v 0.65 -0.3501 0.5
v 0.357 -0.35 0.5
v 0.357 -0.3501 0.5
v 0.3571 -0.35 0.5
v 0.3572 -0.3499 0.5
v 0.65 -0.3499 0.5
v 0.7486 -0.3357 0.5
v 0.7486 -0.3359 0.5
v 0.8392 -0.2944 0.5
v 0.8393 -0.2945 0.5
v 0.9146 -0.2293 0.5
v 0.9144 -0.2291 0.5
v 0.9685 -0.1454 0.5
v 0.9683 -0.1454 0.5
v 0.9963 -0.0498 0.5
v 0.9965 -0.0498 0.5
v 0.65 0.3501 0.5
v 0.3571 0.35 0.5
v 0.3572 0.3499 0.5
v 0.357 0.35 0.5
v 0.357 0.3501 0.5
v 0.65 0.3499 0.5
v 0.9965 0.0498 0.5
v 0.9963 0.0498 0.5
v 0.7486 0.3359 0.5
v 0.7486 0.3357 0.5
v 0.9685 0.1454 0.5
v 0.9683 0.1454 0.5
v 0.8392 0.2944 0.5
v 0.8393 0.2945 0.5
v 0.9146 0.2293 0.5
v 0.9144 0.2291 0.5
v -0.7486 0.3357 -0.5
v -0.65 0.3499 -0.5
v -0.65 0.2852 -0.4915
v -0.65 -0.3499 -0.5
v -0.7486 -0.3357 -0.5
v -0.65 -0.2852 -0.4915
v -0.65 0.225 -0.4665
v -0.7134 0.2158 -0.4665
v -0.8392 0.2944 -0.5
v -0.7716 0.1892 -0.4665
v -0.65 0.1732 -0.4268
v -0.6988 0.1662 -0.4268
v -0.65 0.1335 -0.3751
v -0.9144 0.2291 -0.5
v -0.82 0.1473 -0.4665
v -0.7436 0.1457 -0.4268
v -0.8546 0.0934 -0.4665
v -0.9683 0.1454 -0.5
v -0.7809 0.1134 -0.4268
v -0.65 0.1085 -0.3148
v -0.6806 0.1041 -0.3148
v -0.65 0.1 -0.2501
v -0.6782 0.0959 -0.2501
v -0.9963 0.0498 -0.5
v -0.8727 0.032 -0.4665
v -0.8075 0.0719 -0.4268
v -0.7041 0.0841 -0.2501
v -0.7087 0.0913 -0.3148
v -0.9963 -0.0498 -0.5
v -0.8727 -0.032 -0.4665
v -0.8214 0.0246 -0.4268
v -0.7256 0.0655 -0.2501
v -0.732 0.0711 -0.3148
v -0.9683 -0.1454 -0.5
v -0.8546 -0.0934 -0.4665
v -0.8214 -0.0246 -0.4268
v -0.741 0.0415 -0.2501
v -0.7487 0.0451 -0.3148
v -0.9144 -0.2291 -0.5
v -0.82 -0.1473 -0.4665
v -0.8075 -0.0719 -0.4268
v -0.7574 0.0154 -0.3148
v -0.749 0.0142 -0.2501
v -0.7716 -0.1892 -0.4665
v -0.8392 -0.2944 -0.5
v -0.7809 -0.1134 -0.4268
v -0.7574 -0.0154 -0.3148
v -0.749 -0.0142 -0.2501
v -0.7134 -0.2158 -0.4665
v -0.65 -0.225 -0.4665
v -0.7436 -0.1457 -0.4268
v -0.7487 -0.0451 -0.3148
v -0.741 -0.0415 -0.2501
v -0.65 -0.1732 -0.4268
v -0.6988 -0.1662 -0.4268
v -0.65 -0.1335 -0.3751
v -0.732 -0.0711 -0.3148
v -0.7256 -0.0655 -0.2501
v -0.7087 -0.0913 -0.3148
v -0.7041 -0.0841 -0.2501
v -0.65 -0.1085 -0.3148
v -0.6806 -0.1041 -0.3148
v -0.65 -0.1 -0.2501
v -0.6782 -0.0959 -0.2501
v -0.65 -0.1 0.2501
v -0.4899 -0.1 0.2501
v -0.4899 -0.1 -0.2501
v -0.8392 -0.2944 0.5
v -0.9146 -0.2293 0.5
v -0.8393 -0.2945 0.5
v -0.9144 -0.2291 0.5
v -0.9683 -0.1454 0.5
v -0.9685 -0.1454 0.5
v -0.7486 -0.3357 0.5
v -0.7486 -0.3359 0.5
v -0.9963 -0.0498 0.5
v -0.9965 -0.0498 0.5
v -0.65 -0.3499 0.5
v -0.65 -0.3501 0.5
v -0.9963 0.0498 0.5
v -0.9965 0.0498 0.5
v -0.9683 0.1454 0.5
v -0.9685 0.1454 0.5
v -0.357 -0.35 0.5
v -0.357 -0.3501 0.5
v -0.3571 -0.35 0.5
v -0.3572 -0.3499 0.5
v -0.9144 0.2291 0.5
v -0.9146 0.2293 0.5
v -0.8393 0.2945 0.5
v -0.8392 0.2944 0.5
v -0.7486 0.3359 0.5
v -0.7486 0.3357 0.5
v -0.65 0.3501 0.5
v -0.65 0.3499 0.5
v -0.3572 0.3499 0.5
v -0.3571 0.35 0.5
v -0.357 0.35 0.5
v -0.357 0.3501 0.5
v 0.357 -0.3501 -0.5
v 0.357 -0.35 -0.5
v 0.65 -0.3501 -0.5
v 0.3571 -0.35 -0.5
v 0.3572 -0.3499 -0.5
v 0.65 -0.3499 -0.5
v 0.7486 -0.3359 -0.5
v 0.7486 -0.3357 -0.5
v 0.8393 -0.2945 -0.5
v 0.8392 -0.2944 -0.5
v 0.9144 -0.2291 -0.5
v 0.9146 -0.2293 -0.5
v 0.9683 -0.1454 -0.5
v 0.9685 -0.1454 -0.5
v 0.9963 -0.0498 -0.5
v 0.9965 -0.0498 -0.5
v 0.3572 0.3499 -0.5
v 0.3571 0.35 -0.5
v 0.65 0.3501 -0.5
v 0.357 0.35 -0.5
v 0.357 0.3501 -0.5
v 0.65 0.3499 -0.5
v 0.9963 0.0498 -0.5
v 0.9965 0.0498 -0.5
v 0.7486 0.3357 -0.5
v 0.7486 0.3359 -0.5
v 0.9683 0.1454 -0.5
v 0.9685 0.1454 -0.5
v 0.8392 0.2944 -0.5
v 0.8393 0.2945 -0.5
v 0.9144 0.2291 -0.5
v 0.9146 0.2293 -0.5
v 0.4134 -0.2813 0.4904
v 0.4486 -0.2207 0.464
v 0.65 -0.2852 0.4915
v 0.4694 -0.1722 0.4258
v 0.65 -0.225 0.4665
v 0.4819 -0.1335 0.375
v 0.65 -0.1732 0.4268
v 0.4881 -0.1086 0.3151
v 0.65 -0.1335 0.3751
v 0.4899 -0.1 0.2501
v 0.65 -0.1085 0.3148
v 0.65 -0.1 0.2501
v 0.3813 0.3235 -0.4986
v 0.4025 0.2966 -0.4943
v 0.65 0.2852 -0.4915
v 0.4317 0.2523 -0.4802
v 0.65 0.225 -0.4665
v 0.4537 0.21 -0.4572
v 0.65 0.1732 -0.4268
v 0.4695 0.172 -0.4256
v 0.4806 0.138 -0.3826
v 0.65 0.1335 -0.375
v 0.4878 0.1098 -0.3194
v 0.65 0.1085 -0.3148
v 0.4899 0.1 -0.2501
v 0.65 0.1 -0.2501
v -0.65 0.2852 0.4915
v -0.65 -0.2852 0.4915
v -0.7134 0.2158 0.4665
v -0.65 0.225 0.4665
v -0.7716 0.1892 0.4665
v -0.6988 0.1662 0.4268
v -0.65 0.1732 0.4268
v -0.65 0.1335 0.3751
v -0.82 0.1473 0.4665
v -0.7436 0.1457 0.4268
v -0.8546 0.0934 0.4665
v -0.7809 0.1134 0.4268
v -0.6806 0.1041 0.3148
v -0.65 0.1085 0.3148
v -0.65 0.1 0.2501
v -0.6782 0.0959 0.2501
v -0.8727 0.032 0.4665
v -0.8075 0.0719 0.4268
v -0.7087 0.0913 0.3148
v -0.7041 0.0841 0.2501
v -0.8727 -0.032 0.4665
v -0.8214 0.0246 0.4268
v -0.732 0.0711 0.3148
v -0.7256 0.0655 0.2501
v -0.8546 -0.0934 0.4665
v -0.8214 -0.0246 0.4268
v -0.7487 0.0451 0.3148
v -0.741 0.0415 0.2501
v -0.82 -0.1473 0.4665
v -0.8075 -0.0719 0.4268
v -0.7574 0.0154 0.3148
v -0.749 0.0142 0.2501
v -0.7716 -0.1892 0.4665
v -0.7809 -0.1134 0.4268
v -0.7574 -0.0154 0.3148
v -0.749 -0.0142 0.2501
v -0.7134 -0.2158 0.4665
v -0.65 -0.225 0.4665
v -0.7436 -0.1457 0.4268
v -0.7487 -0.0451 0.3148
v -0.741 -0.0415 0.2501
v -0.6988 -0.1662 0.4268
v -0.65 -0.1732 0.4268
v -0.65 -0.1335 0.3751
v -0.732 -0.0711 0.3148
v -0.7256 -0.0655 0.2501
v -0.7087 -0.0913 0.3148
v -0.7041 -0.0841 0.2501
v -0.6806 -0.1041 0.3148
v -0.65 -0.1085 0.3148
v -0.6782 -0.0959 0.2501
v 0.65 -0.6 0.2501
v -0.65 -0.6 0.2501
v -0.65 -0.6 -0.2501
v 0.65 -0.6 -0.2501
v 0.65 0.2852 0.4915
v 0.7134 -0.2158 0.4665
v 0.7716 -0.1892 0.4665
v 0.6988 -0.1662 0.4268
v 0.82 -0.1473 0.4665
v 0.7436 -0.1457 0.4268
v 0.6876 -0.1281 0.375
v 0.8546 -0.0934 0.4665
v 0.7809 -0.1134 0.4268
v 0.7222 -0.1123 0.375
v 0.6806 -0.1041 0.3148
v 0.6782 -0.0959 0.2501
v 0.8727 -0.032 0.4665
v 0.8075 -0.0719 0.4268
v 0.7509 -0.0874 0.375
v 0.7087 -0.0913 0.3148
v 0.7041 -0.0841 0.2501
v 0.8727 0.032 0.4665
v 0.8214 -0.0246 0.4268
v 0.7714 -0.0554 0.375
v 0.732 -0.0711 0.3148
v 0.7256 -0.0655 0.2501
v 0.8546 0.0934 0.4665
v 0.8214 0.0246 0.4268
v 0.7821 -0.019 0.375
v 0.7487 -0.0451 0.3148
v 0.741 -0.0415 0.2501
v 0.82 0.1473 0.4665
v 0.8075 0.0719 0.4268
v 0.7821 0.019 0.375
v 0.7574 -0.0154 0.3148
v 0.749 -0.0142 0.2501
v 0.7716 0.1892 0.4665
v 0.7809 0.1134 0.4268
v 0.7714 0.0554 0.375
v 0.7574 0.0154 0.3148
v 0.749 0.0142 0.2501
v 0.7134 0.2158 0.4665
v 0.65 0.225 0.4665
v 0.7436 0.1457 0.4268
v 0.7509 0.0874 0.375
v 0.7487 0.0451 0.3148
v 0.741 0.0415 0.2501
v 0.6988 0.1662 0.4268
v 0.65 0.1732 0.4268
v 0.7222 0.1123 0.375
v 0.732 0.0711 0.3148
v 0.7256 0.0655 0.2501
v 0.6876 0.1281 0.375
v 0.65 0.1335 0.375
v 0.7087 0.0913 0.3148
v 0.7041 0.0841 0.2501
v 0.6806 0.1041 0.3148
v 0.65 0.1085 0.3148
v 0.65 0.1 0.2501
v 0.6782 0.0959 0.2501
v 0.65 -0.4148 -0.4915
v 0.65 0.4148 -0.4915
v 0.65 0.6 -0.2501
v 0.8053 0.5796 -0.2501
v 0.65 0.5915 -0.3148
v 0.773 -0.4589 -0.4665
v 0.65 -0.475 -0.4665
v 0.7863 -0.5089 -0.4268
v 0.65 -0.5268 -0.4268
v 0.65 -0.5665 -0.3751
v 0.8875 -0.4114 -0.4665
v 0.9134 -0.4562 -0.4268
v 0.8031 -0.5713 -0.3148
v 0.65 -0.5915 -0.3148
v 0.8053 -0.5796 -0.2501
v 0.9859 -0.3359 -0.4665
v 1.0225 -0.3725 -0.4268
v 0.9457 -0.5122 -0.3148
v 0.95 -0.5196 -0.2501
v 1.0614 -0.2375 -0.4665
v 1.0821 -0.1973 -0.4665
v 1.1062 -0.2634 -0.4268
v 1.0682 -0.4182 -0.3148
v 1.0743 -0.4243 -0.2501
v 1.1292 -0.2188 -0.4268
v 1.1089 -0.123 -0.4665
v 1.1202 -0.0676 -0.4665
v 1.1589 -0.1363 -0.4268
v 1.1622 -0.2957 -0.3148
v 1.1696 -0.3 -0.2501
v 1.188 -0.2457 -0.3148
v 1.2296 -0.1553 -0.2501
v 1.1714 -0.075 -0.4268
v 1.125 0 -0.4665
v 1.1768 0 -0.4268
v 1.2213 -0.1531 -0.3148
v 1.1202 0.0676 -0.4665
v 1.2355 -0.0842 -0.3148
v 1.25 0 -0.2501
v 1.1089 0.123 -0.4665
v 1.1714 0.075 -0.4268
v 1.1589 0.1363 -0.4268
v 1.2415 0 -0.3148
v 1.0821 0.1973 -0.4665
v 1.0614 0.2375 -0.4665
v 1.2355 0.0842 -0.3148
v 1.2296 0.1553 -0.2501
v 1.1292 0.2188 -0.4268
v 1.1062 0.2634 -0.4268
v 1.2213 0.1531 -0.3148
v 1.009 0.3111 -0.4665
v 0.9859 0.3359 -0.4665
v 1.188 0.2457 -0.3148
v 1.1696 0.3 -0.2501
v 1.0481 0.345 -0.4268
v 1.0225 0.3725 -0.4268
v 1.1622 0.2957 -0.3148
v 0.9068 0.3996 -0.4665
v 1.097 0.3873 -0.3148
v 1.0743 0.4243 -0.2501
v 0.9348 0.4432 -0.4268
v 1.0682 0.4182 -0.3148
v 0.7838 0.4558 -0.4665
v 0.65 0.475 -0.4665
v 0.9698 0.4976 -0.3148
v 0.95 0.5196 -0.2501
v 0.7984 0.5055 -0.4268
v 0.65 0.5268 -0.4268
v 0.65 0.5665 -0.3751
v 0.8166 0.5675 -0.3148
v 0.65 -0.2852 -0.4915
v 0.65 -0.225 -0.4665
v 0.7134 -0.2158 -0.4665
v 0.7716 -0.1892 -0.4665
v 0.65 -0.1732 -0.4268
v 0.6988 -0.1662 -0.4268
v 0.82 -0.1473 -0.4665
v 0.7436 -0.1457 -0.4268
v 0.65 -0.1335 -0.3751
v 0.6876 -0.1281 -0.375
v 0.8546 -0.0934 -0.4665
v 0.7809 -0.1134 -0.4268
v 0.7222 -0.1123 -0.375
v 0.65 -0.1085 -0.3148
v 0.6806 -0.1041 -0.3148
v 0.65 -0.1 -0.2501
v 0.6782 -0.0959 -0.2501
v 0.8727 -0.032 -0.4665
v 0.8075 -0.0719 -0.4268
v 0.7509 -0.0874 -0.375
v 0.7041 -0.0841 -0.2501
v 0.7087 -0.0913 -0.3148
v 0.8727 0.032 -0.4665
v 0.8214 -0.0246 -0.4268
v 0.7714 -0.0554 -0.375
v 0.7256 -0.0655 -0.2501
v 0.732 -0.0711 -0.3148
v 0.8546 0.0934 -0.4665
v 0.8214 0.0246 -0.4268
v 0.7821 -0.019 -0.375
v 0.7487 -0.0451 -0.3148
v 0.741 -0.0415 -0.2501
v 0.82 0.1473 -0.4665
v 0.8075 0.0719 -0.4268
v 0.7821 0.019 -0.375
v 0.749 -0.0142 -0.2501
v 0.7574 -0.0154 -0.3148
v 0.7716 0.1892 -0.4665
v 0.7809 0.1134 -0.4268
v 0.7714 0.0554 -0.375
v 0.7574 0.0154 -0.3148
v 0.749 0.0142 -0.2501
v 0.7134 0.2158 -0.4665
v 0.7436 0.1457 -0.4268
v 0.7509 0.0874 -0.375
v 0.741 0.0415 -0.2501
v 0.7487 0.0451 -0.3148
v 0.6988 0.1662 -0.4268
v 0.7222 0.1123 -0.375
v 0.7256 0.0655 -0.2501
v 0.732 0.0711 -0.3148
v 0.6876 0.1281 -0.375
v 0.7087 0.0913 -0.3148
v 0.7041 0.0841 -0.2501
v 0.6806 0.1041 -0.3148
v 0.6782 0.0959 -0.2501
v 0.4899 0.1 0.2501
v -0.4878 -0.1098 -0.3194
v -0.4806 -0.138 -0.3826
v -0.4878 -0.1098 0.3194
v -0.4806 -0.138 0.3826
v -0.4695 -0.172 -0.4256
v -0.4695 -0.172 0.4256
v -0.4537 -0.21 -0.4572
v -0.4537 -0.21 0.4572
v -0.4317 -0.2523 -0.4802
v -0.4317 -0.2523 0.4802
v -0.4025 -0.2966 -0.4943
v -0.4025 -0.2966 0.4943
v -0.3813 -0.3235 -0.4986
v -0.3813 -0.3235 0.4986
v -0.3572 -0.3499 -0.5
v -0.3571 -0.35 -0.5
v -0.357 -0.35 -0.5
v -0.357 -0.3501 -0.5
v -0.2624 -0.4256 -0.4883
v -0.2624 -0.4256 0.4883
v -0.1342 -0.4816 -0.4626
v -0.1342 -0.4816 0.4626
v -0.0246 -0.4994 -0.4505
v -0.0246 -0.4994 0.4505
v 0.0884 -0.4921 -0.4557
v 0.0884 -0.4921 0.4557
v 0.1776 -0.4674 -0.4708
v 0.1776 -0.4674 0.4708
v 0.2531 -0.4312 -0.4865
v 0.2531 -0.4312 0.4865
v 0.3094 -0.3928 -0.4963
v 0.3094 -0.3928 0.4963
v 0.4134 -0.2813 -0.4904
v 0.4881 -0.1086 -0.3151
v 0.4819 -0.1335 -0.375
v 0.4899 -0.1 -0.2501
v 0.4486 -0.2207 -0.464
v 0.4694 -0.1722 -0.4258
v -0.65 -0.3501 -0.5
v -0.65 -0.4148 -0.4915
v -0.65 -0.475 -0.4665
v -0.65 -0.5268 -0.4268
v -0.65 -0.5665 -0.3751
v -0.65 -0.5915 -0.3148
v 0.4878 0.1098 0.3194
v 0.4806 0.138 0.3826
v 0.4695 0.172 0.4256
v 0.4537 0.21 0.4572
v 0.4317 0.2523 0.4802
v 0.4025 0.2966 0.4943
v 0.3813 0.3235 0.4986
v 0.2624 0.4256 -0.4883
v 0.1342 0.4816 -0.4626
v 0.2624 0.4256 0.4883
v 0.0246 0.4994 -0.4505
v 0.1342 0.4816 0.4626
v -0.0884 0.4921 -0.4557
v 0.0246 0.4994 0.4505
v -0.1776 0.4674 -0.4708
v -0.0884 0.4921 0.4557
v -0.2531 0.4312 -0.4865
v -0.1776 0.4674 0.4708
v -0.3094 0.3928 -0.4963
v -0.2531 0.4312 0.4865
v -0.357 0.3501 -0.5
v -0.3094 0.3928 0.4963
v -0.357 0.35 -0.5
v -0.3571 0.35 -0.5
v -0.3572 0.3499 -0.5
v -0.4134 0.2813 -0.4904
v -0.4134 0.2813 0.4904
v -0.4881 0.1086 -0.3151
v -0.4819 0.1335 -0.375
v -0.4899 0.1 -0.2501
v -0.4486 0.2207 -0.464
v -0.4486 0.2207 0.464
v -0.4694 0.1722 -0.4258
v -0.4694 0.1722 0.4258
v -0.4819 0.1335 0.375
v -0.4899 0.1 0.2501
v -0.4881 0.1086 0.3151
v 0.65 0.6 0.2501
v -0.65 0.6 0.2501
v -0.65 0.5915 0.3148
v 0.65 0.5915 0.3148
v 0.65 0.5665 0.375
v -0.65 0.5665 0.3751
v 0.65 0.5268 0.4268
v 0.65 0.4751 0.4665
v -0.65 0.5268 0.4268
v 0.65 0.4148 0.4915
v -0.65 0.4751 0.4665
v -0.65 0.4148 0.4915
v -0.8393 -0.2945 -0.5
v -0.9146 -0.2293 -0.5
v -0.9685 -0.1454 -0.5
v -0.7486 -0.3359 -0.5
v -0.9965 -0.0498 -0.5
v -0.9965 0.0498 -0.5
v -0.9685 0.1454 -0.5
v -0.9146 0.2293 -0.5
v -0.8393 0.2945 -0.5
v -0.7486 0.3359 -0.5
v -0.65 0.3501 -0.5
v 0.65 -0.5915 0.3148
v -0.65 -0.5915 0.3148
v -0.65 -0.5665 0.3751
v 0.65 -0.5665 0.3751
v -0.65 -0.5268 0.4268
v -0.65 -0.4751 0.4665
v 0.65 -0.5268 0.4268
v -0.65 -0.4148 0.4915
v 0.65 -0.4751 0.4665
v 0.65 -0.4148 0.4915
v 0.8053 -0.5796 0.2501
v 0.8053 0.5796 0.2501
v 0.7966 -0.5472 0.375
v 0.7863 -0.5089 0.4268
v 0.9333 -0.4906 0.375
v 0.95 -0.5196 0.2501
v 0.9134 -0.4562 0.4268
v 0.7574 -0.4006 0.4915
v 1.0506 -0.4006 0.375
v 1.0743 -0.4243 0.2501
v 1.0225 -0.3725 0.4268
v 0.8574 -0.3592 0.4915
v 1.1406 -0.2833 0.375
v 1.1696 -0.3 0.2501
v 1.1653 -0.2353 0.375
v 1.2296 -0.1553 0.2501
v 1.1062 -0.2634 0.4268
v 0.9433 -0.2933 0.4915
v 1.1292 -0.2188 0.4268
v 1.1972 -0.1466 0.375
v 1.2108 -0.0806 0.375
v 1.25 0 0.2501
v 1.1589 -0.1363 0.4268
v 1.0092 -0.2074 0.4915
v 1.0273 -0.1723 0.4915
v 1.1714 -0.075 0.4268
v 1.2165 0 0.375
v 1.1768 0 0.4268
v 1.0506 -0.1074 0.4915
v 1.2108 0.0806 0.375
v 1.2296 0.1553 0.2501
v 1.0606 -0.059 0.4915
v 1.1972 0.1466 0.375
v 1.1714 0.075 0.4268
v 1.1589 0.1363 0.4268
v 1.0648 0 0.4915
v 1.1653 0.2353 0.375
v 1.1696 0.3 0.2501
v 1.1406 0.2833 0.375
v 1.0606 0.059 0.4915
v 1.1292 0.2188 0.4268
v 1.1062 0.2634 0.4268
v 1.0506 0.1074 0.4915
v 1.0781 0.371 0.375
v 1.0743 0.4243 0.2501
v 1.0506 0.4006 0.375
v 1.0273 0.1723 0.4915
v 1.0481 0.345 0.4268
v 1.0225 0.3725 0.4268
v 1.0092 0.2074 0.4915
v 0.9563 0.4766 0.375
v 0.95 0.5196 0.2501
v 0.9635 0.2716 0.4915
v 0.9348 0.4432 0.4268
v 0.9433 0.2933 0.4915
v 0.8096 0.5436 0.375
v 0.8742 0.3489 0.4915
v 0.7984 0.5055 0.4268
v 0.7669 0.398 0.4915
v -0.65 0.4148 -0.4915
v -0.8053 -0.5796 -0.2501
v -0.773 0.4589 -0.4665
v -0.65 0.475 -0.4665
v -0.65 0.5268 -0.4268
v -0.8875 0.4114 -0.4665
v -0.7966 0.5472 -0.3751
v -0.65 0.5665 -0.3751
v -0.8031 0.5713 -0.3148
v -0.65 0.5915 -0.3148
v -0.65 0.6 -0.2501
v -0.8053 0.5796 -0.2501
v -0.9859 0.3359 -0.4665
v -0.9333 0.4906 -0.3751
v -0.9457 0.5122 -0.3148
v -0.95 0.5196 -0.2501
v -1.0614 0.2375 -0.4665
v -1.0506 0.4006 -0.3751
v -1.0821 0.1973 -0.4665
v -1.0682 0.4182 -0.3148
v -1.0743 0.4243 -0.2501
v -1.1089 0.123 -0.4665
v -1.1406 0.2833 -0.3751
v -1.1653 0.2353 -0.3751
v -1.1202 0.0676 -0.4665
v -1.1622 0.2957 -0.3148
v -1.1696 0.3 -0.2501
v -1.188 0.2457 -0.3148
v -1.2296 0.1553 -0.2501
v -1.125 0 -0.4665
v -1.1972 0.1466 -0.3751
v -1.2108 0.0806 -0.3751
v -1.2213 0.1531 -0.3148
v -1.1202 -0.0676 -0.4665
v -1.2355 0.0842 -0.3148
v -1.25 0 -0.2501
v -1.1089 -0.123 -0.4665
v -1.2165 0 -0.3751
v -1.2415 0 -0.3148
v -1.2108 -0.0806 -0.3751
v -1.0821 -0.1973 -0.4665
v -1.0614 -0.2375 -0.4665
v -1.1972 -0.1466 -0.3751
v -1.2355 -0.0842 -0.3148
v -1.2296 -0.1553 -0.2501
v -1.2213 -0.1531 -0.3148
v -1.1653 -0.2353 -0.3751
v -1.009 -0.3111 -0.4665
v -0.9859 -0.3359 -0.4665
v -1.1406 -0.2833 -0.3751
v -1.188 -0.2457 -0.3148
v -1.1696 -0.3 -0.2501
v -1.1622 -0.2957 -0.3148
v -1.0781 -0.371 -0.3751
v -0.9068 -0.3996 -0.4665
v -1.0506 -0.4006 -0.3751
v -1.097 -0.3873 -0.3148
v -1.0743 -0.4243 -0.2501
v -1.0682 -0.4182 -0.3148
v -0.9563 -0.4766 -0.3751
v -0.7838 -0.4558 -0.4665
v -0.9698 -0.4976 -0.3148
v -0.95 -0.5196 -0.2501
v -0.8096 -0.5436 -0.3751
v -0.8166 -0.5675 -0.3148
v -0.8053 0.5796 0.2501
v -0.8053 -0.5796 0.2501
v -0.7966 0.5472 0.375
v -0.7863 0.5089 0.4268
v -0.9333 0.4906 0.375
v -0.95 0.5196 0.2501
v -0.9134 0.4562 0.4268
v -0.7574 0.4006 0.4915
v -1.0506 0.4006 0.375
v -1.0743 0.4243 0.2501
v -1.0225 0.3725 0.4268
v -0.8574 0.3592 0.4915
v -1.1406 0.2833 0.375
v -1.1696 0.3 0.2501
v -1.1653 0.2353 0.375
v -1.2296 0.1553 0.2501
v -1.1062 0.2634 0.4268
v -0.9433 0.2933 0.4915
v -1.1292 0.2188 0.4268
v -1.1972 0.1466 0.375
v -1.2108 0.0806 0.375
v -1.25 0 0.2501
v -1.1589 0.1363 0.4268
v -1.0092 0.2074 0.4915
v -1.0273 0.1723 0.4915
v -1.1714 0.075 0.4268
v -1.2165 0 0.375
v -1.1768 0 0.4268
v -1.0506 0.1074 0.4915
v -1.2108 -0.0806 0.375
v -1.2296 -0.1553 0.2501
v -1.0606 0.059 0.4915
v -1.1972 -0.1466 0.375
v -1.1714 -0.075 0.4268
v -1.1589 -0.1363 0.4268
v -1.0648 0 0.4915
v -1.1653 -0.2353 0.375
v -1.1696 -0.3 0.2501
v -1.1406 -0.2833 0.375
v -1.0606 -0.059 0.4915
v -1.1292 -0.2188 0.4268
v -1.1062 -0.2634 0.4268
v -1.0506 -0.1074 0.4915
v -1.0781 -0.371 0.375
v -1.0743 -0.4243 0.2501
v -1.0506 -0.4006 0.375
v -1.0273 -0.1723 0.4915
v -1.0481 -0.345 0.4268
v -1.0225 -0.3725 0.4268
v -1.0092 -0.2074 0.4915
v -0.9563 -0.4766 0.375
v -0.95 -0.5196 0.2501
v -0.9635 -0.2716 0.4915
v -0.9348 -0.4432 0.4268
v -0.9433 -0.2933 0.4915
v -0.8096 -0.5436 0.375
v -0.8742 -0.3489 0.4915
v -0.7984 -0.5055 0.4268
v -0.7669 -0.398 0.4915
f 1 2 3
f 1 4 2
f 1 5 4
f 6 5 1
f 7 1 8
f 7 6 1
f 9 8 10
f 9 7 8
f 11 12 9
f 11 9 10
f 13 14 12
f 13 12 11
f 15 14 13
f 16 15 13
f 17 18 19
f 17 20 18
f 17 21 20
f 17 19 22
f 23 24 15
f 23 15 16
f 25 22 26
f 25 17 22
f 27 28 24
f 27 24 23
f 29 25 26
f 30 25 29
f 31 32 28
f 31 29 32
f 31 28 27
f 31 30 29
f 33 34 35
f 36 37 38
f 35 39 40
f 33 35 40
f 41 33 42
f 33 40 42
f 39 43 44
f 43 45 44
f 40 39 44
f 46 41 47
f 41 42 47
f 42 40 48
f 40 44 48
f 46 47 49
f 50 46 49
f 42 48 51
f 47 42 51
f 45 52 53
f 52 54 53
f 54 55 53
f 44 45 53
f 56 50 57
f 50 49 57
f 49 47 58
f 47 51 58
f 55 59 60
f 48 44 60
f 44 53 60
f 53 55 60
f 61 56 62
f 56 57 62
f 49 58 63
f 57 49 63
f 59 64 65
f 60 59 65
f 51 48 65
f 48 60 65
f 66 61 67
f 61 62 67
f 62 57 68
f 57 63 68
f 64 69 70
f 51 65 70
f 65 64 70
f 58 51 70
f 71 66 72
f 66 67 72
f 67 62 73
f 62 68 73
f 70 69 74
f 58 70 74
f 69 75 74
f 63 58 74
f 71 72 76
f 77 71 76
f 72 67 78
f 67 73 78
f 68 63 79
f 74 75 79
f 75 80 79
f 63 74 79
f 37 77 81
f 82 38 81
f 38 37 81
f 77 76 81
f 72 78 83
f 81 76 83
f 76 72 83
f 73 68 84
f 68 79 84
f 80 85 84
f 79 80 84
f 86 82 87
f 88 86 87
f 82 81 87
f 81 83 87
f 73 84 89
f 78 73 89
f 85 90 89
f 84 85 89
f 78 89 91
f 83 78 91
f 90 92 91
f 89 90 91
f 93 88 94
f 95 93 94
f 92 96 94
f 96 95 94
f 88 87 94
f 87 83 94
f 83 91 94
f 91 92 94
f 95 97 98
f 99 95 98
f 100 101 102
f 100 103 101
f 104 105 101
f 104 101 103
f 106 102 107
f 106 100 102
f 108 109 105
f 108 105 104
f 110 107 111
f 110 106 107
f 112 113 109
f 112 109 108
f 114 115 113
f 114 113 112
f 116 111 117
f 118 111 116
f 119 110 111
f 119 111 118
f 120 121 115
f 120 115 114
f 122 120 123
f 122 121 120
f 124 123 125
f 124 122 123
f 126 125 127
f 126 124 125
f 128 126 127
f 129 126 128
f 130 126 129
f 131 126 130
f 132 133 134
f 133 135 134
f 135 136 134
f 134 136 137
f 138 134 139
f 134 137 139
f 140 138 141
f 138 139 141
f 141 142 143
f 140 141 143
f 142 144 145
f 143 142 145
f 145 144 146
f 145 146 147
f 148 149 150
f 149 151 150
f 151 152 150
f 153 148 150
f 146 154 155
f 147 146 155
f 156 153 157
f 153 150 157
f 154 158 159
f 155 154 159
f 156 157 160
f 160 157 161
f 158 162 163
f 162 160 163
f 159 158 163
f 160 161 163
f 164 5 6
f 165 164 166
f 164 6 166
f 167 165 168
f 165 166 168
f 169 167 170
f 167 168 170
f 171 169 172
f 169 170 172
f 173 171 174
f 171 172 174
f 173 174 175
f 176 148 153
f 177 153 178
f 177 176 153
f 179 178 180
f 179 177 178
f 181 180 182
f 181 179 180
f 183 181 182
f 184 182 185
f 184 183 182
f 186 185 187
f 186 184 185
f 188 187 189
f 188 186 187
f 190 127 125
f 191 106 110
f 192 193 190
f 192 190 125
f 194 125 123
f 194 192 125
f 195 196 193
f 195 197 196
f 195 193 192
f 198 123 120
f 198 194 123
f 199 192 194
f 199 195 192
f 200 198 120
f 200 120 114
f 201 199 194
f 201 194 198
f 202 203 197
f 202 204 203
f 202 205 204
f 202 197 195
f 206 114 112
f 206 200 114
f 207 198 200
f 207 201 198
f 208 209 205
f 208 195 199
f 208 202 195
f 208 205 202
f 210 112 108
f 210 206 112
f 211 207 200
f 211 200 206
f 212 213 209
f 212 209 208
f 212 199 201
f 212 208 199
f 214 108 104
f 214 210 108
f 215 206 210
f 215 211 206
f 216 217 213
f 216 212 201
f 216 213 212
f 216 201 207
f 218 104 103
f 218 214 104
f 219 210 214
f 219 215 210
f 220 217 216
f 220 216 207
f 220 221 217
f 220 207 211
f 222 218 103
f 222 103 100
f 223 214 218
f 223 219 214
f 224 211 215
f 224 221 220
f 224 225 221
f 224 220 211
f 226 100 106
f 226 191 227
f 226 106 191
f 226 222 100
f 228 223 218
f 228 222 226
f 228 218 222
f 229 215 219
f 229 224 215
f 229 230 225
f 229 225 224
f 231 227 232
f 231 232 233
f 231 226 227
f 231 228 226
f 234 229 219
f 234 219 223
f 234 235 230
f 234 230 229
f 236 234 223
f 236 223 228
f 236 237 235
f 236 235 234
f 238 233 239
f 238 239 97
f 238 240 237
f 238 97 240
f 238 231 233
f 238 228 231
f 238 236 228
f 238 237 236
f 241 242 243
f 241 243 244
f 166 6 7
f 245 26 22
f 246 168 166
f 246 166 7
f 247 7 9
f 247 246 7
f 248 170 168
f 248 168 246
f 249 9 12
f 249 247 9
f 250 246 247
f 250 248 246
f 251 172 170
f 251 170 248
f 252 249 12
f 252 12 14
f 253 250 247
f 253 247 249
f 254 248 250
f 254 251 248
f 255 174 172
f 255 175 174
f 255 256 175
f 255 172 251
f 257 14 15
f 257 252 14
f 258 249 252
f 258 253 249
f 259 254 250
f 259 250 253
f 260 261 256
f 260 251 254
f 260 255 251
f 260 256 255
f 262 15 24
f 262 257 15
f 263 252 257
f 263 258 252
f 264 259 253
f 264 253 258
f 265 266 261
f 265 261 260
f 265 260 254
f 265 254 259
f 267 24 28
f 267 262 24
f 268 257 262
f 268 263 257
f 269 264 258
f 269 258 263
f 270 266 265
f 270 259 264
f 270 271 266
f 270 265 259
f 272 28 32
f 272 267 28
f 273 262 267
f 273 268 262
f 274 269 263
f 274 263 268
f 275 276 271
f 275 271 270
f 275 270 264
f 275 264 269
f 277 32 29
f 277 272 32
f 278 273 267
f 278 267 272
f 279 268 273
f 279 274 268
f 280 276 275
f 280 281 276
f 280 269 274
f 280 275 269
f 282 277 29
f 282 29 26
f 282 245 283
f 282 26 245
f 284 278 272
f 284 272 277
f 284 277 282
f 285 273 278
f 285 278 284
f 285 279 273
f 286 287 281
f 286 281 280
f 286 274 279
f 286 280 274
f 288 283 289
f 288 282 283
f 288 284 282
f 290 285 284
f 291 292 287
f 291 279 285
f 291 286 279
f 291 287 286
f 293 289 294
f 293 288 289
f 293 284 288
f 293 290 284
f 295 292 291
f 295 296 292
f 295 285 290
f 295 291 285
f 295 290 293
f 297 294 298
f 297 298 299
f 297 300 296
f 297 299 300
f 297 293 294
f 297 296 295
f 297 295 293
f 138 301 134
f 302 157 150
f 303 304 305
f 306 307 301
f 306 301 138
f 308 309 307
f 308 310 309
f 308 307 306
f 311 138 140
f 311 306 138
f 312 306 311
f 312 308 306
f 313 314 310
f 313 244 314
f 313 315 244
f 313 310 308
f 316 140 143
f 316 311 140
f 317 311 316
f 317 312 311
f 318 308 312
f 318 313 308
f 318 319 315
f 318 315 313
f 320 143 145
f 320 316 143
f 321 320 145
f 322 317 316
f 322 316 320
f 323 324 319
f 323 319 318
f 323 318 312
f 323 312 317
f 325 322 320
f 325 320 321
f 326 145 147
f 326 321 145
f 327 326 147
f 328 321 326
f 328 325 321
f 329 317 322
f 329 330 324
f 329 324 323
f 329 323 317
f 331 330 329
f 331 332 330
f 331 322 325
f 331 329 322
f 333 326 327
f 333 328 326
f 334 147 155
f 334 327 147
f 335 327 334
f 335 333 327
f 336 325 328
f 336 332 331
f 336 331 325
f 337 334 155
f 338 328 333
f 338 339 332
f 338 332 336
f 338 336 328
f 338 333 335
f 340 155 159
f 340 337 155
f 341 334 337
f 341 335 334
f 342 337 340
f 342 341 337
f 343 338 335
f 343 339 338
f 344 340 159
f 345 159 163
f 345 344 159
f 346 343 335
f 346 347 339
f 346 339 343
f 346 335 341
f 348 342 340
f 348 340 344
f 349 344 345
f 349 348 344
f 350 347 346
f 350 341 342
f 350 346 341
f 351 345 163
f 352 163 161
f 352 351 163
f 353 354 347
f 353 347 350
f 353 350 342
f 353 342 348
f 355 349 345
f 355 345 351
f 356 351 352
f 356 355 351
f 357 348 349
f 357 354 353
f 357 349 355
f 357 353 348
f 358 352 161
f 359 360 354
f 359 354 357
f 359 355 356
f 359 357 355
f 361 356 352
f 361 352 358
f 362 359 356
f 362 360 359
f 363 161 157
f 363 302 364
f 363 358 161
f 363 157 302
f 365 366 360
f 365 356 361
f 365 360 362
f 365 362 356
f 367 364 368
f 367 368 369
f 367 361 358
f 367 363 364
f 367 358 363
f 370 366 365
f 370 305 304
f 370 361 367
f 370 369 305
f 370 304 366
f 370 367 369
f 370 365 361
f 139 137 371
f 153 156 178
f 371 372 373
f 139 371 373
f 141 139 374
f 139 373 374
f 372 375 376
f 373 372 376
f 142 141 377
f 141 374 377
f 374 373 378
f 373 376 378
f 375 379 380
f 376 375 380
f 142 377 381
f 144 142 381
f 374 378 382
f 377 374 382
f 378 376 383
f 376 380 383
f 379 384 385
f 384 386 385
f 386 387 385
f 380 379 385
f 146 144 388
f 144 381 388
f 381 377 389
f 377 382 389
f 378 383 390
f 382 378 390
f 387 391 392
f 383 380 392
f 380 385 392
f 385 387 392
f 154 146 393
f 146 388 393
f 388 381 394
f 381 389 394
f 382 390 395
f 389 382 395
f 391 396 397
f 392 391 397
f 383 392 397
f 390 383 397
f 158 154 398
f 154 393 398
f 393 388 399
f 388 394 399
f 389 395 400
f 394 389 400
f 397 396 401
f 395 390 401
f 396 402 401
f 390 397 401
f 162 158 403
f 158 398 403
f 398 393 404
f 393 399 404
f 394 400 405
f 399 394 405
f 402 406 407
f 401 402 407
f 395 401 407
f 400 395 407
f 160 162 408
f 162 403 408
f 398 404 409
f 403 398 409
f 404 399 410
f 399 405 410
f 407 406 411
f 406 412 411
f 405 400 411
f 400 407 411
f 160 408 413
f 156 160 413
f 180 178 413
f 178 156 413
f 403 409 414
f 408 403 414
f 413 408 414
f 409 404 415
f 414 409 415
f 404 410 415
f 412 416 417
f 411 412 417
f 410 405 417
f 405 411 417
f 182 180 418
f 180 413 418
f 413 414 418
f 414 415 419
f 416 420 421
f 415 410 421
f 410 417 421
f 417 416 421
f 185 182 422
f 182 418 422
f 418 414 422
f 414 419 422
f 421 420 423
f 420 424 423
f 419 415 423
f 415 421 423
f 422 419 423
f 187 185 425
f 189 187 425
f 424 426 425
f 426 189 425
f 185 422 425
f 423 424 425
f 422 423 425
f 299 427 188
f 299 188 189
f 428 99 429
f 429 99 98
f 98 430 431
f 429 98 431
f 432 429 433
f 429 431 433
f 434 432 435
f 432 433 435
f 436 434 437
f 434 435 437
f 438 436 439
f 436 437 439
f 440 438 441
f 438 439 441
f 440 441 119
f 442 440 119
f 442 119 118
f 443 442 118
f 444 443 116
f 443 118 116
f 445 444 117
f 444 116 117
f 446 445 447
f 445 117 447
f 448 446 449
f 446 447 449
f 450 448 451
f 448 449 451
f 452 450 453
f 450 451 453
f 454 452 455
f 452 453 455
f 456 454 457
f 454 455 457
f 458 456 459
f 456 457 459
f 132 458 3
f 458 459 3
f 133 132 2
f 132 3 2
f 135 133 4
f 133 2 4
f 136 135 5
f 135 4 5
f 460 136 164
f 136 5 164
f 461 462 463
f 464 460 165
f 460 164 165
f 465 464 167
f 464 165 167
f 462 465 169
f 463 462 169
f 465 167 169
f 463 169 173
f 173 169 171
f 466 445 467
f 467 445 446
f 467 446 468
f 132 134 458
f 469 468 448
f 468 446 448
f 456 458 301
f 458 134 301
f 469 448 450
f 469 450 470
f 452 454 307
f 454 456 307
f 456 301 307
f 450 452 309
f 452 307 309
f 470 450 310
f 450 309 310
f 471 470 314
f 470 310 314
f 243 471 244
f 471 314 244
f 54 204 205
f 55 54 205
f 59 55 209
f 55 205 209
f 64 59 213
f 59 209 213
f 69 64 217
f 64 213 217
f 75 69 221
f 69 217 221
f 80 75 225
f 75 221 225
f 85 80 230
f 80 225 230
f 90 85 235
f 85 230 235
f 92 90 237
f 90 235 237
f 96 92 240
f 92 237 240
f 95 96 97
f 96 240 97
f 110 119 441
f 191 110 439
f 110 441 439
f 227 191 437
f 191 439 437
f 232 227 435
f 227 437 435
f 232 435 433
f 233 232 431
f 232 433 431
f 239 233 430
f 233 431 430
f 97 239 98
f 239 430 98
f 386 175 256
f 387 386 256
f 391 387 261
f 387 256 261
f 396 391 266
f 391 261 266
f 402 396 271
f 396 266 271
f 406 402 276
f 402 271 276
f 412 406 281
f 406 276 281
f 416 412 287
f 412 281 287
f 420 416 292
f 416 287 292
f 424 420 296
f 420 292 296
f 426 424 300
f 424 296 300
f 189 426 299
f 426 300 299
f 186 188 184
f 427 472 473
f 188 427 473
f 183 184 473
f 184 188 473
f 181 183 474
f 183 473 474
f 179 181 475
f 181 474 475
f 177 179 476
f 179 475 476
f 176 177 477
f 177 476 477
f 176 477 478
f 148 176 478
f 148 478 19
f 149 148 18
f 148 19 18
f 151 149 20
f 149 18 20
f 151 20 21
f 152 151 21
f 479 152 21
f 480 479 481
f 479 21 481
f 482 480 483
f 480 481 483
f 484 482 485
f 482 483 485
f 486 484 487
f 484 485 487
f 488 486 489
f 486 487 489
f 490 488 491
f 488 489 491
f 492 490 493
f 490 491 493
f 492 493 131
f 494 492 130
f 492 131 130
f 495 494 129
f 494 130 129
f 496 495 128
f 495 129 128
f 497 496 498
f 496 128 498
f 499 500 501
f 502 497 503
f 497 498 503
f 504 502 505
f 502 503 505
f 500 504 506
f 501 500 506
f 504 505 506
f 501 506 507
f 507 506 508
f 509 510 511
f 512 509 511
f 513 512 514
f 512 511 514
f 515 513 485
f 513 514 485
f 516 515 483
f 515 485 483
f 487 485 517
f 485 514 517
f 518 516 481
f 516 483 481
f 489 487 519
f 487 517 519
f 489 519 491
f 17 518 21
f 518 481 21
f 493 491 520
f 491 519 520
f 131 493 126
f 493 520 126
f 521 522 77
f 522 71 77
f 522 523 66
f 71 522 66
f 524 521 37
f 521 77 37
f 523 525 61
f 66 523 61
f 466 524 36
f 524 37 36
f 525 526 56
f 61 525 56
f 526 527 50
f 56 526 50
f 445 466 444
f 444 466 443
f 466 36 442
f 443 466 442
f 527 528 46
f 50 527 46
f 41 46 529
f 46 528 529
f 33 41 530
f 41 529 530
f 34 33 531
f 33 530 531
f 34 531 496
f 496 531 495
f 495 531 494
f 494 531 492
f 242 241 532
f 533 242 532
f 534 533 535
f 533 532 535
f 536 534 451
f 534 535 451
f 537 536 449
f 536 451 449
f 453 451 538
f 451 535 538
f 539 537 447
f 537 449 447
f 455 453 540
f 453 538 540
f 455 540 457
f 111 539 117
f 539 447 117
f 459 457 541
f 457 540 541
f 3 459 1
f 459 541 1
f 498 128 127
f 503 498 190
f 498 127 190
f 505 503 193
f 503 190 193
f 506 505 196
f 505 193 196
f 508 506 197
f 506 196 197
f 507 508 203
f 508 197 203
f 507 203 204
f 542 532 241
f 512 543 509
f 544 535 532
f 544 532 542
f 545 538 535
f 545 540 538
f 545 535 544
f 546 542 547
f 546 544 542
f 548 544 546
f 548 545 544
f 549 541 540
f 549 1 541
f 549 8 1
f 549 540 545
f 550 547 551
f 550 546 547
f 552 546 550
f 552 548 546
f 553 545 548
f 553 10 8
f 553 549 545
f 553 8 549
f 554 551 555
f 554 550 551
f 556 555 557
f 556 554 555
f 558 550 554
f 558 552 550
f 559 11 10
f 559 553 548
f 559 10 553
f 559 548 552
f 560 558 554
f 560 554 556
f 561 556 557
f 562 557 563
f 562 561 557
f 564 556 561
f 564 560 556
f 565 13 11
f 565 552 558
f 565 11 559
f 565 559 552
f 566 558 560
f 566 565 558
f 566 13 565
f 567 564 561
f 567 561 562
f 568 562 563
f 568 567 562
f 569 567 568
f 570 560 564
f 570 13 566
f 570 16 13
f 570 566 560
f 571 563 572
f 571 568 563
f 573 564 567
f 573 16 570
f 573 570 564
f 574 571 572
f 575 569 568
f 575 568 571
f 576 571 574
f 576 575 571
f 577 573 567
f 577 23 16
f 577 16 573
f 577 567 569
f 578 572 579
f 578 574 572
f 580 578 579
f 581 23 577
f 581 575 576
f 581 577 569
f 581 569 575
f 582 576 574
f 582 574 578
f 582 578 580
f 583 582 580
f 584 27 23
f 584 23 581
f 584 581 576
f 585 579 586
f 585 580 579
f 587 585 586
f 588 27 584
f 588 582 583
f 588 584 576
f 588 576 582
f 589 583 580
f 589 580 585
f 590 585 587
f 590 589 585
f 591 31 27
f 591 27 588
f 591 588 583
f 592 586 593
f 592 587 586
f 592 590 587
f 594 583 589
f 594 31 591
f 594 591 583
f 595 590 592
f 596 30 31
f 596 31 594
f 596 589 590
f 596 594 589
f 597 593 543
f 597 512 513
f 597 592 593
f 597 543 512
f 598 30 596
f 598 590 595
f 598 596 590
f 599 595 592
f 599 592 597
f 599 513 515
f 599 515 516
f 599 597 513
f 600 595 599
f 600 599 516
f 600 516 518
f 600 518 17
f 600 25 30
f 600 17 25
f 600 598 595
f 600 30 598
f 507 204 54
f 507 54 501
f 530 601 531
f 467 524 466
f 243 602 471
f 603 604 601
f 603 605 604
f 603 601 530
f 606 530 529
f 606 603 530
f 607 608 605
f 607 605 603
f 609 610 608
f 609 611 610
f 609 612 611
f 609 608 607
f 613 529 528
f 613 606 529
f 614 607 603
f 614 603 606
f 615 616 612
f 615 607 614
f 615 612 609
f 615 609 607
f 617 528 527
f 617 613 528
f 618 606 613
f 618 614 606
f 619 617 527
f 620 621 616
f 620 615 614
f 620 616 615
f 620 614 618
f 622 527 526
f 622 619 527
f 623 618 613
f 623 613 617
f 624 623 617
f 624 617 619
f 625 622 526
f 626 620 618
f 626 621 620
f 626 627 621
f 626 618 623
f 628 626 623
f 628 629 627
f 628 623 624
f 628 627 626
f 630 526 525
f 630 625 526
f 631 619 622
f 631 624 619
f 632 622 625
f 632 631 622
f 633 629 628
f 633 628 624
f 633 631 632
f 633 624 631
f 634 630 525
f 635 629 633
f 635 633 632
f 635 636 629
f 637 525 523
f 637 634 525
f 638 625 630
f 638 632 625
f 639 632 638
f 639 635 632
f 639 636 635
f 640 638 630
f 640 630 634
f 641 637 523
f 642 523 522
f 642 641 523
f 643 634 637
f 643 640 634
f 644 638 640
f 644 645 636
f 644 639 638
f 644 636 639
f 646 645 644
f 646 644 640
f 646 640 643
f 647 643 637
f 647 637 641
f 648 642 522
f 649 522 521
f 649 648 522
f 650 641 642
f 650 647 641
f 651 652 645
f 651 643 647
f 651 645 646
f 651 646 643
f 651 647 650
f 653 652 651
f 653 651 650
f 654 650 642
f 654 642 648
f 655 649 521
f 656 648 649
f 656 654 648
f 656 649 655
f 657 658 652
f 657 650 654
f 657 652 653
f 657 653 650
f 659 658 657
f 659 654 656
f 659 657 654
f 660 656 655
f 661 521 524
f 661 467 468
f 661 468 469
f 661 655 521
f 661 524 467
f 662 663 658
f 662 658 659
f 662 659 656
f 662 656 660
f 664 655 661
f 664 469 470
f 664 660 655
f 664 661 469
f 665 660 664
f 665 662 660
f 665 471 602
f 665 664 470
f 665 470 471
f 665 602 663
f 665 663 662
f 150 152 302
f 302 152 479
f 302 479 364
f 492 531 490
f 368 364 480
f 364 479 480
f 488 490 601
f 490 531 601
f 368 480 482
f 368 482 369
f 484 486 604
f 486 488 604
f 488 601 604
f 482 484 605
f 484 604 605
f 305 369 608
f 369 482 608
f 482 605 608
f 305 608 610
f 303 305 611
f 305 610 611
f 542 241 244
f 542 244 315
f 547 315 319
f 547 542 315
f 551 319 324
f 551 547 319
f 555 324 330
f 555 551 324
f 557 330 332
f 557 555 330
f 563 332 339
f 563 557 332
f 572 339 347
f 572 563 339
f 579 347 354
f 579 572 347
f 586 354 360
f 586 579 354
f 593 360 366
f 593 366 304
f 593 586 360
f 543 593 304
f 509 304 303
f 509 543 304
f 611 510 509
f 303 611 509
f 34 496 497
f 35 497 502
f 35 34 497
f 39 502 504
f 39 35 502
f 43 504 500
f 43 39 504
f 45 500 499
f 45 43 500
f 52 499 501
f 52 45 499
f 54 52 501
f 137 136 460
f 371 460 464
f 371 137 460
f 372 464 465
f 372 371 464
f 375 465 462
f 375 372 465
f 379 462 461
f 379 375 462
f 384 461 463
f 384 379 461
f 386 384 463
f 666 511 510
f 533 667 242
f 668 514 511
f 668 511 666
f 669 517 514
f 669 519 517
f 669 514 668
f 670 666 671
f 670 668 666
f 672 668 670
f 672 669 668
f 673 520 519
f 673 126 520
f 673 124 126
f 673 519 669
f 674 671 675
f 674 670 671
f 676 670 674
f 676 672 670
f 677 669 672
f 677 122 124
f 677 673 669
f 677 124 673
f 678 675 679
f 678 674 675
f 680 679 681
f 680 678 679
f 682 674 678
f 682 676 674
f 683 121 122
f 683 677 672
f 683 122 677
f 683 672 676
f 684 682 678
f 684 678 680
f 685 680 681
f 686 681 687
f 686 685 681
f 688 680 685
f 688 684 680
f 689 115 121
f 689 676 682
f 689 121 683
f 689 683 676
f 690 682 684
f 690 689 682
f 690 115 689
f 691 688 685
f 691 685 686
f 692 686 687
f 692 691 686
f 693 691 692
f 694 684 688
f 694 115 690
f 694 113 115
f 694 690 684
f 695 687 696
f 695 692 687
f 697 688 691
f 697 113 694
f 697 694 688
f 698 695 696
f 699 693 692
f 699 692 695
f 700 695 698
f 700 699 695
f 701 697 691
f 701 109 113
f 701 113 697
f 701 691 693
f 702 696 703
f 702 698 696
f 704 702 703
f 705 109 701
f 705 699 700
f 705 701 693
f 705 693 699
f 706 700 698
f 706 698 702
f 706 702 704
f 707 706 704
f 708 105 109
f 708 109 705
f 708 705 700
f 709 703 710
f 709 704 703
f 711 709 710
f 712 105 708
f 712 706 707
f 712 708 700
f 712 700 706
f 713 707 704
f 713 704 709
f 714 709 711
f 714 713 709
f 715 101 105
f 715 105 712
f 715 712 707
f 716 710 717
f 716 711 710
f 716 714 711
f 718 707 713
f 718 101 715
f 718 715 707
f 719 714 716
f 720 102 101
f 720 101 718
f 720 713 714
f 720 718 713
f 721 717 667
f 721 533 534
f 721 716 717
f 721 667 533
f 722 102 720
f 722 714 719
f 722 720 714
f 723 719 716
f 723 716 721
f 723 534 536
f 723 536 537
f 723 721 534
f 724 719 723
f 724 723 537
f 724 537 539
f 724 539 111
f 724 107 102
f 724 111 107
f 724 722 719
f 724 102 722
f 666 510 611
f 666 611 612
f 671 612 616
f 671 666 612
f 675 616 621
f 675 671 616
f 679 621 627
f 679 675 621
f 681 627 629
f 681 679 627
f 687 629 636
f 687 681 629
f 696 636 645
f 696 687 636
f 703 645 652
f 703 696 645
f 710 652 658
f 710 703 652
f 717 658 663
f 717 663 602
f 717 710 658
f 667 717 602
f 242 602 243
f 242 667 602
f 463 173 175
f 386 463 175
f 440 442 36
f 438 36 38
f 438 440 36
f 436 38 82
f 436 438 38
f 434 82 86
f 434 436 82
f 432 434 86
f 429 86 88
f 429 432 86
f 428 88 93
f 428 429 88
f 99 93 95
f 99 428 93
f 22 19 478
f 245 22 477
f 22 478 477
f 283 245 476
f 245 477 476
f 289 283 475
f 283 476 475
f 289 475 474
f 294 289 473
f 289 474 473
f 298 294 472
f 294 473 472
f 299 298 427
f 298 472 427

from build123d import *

# Parameters (mm, degrees)
PAD_DEPTH       = 0.5
POCKET_DEPTH    = 5
FILLET_R        = 0.2499
SKETCH002_R     = 0.5
POCKET001_DEPTH = 2.5


with BuildPart() as part:
    # Sketch (on XY_Plane of Origin) → Pad (new body, symmetric)
    with BuildSketch(Plane.XY):
        with BuildLine():
            ThreePointArc((-0.65, 0.6), (-1.25, 0), (-0.65, -0.6))
            Line((-0.65, -0.6), (0.65, -0.6))
            ThreePointArc((0.65, -0.6), (1.25, 0), (0.65, 0.6))
            Line((-0.65, 0.6), (0.65, 0.6))
        make_face()
    extrude(amount=PAD_DEPTH, both=True)

    # Sketch001 (on Face6 of Pad) → Pocket (cut)
    with BuildSketch(Plane.XY.offset(0.5)):
        with BuildLine():
            ThreePointArc((-0.65, 0.1), (-0.75, 0), (-0.65, -0.1))
            Line((-0.65, -0.1), (0.65, -0.1))
            ThreePointArc((0.65, -0.1), (0.75, 0), (0.65, 0.1))
            Line((-0.65, 0.1), (0.65, 0.1))
        make_face()
    extrude(amount=-POCKET_DEPTH, mode=Mode.SUBTRACT)

    # Fillet
    fillet_edges = [part.edges().sort_by_distance(p)[0] for p in [
        (0, -0.6, 0.5),
        (0, -0.1, 0.5),
        (0, -0.6, -0.5),
        (0, -0.1, -0.5),
    ]]
    fillet(fillet_edges, radius=FILLET_R)

    # Sketch002 (on XY_Plane of Origin) → Pocket001 (cut, symmetric)
    with BuildSketch(Plane.XY):
        Circle(SKETCH002_R)
    extrude(amount=POCKET001_DEPTH, both=True, mode=Mode.SUBTRACT)


solid = part.part
